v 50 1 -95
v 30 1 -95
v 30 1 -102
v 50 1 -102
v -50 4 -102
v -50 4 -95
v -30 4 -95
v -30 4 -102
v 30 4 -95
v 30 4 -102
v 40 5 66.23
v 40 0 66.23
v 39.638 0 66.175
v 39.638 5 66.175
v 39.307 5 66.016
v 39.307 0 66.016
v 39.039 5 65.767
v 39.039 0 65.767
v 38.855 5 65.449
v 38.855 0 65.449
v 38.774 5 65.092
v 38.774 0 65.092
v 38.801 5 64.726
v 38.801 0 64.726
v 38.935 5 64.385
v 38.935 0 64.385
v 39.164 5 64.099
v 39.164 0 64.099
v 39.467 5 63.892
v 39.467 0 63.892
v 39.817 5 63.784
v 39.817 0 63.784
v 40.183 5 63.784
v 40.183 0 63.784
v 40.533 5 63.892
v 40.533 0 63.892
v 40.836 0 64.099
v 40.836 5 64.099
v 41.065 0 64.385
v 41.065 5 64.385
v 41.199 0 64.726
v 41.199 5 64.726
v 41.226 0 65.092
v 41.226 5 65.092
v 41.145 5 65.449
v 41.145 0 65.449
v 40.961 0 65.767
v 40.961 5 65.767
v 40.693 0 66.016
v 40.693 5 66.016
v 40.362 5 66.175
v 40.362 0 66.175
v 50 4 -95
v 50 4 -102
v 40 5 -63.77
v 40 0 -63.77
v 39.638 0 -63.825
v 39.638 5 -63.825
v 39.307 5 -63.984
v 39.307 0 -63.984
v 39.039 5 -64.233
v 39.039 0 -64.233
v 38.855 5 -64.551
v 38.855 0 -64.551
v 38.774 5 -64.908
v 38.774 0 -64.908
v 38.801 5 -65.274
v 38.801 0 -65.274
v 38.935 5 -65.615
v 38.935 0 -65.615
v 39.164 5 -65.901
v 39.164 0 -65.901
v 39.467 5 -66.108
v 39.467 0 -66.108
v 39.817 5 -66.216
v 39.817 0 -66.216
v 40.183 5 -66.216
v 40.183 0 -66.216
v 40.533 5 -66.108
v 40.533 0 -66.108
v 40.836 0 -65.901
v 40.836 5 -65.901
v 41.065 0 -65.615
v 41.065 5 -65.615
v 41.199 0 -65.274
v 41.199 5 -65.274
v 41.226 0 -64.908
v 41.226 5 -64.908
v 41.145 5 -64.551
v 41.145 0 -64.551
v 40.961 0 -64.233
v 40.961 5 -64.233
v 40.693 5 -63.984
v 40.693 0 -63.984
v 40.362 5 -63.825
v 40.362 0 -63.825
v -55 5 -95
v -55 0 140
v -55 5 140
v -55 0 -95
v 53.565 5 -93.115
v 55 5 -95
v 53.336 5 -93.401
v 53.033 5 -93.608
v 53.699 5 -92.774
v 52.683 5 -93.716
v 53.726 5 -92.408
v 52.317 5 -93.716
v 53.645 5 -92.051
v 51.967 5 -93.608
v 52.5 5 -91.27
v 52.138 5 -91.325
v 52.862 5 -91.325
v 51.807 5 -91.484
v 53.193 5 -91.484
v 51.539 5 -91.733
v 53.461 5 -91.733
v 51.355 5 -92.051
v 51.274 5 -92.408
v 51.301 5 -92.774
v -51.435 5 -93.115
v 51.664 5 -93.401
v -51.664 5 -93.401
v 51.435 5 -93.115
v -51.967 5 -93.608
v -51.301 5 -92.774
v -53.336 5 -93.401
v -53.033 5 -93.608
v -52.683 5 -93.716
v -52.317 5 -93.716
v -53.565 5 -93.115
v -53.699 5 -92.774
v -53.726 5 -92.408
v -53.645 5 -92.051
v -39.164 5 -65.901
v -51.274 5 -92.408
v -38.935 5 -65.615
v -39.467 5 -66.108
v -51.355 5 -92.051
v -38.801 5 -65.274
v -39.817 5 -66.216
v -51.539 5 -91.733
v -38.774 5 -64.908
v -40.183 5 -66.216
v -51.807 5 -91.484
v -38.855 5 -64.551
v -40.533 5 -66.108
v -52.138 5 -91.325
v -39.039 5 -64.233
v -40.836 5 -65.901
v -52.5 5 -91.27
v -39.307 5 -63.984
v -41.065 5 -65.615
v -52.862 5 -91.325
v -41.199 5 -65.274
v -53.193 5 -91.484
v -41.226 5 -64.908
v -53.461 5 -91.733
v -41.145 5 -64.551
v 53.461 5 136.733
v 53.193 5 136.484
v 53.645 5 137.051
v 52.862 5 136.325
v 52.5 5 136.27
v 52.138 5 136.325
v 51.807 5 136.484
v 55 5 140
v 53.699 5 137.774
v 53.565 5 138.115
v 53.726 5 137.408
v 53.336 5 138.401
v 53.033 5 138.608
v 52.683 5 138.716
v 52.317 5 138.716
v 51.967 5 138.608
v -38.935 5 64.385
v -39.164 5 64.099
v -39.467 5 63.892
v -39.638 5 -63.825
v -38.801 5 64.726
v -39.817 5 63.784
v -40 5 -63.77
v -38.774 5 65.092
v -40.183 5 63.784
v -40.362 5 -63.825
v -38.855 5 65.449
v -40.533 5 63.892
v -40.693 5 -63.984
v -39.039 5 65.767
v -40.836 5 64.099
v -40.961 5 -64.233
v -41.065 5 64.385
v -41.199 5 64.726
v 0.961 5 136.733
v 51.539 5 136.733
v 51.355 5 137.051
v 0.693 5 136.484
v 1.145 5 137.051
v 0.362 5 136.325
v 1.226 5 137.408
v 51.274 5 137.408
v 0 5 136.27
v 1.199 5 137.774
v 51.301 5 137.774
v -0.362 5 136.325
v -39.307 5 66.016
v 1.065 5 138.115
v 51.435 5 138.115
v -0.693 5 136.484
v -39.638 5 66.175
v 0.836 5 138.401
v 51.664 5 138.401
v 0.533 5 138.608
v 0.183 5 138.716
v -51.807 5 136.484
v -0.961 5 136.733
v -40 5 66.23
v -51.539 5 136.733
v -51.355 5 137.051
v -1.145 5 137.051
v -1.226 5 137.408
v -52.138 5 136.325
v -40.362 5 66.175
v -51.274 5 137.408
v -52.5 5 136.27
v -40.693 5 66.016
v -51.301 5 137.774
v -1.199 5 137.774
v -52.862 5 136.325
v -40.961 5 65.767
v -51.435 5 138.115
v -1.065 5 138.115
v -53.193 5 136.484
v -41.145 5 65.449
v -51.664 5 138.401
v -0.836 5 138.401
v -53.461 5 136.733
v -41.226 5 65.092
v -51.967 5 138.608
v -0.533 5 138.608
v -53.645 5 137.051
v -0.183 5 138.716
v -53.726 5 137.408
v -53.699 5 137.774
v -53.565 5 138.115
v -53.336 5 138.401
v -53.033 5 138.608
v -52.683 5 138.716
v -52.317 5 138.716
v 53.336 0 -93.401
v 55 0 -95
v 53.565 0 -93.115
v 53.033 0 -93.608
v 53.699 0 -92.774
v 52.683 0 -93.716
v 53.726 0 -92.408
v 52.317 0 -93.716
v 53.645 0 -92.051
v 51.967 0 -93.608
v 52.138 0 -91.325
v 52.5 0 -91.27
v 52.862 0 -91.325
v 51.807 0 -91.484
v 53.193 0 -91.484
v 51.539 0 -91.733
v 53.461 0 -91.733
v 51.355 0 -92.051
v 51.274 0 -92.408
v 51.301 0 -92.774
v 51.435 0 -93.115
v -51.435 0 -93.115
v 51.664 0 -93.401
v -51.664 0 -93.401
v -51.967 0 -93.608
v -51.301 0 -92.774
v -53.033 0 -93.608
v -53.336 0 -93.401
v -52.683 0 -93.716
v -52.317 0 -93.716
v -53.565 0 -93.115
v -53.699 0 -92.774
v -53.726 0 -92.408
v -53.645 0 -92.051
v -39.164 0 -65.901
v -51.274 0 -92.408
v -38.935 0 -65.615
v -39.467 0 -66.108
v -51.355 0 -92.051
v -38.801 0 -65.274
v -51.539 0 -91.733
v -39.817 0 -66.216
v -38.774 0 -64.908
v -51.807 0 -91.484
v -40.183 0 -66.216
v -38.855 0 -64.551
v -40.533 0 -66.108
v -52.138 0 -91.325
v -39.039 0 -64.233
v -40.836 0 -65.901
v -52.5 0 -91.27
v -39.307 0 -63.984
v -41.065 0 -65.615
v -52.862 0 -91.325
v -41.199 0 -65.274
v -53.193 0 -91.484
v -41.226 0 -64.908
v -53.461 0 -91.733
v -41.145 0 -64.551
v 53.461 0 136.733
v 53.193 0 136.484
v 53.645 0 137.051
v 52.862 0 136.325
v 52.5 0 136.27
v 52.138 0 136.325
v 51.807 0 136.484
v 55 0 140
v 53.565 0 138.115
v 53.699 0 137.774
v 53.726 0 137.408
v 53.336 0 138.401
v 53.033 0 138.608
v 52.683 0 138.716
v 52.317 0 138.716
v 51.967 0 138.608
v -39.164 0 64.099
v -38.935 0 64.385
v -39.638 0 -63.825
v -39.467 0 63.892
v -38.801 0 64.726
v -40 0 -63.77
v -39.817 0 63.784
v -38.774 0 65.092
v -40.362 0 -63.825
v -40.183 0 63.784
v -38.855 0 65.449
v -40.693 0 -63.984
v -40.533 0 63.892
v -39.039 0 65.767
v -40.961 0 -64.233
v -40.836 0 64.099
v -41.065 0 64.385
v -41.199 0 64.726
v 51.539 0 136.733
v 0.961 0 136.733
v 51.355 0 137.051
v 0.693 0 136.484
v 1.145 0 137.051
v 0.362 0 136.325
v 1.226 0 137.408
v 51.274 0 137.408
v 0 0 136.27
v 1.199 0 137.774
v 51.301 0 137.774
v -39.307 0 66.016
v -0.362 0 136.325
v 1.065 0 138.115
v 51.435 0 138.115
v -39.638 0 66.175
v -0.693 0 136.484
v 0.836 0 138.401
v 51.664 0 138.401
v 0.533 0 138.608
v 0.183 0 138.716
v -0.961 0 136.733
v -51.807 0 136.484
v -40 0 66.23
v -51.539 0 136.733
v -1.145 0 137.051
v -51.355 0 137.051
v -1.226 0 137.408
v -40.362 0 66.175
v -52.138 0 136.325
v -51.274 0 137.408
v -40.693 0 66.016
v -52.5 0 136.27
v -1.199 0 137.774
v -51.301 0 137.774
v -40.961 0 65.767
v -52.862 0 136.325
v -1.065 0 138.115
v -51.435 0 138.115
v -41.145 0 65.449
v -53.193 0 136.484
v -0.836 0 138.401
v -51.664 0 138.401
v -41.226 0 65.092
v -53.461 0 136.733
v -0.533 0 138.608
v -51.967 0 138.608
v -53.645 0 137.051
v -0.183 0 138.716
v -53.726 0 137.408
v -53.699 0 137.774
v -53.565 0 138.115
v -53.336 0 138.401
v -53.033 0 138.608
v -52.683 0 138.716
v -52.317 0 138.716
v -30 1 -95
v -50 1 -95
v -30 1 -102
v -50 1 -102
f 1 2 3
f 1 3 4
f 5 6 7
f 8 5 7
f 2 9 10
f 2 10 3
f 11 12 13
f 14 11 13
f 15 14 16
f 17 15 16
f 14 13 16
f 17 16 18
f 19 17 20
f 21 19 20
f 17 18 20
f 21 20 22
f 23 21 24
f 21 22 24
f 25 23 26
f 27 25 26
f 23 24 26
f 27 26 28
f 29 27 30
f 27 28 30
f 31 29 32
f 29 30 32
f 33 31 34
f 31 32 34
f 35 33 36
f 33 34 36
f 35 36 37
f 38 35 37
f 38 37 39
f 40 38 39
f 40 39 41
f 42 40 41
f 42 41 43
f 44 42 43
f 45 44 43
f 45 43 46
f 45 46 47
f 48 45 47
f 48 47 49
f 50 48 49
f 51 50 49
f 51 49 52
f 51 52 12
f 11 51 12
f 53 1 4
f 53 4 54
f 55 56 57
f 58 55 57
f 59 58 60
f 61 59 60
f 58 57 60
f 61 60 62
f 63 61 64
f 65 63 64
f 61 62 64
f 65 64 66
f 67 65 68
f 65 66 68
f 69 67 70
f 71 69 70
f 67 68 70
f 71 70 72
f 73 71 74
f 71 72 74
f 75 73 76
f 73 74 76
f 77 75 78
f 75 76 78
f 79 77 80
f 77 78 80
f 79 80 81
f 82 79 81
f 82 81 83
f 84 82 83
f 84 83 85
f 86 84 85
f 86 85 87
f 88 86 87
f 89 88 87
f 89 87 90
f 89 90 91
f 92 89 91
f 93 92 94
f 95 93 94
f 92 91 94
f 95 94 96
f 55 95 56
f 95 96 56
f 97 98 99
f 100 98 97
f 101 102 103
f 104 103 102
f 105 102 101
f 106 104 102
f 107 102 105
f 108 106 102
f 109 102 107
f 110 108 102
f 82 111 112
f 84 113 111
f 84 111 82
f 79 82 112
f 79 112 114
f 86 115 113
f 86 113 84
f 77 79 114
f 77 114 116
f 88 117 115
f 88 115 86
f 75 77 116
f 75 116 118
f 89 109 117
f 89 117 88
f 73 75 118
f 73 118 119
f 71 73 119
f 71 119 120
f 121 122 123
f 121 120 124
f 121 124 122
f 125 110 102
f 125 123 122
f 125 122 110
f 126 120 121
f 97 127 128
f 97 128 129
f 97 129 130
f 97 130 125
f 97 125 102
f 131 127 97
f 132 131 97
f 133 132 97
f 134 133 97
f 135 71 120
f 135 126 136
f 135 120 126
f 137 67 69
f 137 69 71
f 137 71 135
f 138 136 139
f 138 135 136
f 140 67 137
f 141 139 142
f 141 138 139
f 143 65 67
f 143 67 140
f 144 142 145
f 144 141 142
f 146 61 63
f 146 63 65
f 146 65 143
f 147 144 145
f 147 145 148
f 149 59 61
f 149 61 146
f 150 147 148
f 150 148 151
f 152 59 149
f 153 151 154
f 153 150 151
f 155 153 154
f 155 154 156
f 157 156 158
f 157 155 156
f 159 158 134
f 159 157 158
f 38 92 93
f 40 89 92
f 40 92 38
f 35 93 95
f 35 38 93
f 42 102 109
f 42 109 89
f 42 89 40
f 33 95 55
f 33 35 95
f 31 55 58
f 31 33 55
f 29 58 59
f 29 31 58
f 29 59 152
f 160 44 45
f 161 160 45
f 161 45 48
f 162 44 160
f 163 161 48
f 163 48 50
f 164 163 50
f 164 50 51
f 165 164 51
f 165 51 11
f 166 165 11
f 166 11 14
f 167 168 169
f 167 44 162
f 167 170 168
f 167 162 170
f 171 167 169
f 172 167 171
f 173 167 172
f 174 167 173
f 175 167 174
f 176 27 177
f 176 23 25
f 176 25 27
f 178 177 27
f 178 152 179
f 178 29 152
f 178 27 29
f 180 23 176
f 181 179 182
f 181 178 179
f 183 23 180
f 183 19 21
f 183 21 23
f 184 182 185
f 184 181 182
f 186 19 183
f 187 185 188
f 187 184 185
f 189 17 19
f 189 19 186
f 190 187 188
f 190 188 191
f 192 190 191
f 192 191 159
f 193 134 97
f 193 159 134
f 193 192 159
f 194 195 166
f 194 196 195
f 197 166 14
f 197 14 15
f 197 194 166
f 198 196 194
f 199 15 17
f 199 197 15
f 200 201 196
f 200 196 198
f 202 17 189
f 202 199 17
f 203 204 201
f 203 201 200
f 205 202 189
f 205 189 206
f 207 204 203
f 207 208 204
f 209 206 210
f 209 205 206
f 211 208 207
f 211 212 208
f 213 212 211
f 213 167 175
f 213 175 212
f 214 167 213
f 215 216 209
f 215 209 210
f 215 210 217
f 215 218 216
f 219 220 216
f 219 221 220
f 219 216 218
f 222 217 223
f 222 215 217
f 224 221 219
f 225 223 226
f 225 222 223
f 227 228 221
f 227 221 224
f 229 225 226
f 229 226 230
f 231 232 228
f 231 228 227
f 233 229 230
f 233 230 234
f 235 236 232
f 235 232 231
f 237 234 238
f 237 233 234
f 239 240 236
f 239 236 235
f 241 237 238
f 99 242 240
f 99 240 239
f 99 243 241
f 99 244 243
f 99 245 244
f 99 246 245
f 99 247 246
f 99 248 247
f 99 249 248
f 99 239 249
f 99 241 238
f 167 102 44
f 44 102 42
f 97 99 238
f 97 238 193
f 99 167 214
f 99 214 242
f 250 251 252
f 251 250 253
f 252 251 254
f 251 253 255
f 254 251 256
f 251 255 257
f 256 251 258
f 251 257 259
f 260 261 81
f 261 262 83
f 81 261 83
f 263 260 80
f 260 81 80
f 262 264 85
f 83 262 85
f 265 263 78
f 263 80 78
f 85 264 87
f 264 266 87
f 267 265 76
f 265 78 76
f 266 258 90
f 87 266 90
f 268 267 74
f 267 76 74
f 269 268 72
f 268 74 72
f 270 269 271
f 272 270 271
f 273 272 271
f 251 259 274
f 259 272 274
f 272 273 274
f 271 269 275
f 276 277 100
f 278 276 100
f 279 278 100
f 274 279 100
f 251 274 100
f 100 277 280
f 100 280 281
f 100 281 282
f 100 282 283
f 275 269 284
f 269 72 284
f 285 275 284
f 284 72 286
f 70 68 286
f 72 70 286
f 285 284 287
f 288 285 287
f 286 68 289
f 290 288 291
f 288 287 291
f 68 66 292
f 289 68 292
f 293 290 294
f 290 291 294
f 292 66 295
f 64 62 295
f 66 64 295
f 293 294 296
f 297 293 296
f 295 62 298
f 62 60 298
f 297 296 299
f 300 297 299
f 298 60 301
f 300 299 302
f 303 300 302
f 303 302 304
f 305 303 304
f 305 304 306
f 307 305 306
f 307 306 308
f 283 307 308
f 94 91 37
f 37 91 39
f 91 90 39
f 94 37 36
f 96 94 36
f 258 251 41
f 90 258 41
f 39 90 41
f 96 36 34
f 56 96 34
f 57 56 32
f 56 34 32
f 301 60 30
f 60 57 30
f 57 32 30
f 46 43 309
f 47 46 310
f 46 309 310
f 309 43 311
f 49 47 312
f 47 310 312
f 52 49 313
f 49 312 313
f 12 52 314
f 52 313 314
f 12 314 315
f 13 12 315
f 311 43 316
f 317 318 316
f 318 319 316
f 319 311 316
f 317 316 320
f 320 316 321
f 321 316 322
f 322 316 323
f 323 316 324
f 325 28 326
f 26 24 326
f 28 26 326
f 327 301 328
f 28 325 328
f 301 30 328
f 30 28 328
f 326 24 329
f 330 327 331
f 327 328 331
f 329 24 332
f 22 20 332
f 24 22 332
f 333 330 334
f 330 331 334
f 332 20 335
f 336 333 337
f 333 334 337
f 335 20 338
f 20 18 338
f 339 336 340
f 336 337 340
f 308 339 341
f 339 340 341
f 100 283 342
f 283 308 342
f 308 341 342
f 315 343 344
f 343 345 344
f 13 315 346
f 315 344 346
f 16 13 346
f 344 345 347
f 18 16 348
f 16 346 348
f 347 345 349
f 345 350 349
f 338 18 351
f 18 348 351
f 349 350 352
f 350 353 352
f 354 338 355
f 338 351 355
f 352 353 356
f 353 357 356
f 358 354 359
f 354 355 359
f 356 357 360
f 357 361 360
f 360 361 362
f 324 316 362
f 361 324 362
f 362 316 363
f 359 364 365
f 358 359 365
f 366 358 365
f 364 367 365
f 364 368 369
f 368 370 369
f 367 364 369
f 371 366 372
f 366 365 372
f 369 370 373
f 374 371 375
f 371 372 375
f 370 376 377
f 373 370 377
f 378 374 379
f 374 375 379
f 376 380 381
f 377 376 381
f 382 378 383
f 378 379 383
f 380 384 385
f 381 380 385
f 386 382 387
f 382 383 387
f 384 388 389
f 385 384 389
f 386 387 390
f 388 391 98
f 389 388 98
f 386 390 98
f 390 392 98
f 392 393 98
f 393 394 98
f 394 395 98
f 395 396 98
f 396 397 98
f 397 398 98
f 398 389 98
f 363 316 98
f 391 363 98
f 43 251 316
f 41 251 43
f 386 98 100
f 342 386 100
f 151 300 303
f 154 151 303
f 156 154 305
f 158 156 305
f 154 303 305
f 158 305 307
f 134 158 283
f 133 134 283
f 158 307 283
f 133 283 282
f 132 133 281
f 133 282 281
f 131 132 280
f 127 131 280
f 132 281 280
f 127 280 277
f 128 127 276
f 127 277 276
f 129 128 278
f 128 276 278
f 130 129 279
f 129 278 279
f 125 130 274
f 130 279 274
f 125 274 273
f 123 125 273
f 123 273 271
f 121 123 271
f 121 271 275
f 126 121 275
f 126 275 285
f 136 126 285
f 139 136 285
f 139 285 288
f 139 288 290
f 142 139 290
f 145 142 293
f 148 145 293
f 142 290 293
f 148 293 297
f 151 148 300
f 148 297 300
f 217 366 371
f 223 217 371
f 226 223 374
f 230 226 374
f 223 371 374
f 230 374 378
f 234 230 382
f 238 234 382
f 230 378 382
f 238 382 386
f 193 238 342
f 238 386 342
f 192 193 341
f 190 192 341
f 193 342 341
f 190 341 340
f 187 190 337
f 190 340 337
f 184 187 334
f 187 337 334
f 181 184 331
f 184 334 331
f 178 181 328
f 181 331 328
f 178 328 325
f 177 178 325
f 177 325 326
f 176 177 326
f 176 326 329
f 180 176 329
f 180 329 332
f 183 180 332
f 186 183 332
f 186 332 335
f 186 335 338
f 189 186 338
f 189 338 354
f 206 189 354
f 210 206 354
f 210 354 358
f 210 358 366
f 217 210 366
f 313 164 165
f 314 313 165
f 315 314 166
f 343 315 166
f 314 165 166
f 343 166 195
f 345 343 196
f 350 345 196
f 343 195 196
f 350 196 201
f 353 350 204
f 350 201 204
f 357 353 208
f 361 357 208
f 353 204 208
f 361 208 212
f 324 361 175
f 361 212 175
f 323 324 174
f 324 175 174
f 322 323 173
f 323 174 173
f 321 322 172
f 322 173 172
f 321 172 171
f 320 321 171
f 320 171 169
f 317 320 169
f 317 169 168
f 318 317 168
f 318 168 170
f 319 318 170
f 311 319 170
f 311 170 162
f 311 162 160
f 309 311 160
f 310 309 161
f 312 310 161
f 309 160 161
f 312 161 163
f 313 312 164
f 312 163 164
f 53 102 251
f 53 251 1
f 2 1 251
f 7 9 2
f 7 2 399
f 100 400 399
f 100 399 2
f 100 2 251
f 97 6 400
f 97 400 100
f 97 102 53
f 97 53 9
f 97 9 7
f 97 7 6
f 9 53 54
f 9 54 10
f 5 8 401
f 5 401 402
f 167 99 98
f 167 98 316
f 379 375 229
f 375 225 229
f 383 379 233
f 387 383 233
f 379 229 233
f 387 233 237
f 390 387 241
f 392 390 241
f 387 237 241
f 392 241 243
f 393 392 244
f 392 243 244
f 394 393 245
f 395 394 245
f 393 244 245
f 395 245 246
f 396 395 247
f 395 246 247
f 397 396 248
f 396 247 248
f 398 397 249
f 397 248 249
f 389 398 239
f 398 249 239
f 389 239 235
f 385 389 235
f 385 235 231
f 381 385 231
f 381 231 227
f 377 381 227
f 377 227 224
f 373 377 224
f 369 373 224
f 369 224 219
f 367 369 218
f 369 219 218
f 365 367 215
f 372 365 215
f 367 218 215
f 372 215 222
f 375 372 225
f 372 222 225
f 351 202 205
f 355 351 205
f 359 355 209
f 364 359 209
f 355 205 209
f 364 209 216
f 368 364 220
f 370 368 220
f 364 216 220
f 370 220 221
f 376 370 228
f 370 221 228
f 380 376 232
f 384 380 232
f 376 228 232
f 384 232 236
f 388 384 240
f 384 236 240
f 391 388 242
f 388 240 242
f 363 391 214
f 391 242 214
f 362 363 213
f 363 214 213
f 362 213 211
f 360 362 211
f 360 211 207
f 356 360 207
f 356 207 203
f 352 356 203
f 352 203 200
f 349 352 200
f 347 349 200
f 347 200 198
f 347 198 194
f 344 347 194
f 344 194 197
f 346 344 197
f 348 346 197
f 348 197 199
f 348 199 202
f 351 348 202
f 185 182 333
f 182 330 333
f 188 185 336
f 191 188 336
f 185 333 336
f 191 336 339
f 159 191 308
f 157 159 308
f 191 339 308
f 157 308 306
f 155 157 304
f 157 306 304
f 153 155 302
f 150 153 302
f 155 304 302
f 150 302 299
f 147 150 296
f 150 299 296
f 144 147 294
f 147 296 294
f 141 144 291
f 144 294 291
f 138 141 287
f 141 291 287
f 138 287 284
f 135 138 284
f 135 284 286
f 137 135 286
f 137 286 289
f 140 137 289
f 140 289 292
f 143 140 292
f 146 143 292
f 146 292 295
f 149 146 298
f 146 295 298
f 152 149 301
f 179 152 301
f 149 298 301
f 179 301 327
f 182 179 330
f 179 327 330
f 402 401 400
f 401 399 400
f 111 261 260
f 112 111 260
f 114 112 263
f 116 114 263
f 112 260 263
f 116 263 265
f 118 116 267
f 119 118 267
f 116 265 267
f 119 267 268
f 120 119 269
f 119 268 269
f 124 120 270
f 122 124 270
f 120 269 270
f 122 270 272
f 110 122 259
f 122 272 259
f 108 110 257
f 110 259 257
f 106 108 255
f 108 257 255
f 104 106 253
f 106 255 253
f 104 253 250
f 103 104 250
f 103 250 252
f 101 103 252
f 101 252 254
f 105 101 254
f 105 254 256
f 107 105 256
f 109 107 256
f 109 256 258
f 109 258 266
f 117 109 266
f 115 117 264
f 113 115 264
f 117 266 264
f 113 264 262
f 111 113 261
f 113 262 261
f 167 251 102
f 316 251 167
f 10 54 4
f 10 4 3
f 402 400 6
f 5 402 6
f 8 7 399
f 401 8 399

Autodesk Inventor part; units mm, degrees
ref_plane "YZ Plane" through (0, 0, 0) normal (1, 0, 0) x (0, 1, 0)
ref_plane "XZ Plane" through (0, 0, 0) normal (0, 1, 0) x (-1, 0, 0)
ref_plane "XY Plane" through (0, 0, 0) normal (0, 0, 1) x (1, 0, 0)
sketch "Esquisse1" plane through (0, 0, 0) normal (0, 1, 0) x (-1, 0, 0)
  line L0 (55, -100) -> (-55, -100)
  line L1 (-55, -100) -> (-55, 100)
  line L2 (-55, 100) -> (55, 100)
  line L3 (55, 100) -> (55, -100)
  line L4 (55, -100) -> (-55, 100) construction
  line L5 (-55, -100) -> (55, 100) construction
  point P0 (0, 0)
  dimension "d0" = 110
  dimension "d1" = 200
extrude "Extrusion1" add sketch "Esquisse1" along normal blind 5
sketch "Esquisse6" plane through (-55, 0, 100) normal (0, 0, 1) x (1, 0, 0)
  line L0 (0, 0) -> (110, 0) projected
  line L1 (110, 0) -> (110, 5) projected
  line L2 (0, 5) -> (110, 5) projected
  line L3 (0, 0) -> (0, 5) projected
  point P0 (55, 0)
extrude "Extrusion2" add sketch "Esquisse6" along normal blind 40
sketch "Esquisse3" plane through (0, 0, 0) normal (0, -1, 0) x (1, 0, 0)
  line L0 (0, 0) -> (52.5, 0)
  line L1 (52.5, 0) -> (52.5, -97.5)
  line L2 (0, 28.6272) -> (0, -29.3855)
  line L3 (0, 0) -> (0, 137.5)
  line L4 (0, 137.5) -> (52.5, 137.5)
  point P0 (-52.5, -97.5)
  point P1 (-52.5, 137.5)
  dimension "d18" = 52.5
  dimension "d19" = 97.5
  dimension "d49" = 137.5
  dimension "d50" = 52.5
hole "Perçage2" at (52.5, 0, -97.5) at (-52.5, 0, -97.5) at (-52.5, 0, 137.5) at (52.5, 0, 137.5) direction (0, 1, 0) diameter 2.459 end through all thread size "M3x0.5" class "6H" standard "ISO Metric profile"
sketch "Esquisse5" plane through (0, 5, 0) normal (0, 1, 0) x (1, 0, 0)
  line L0 (0, 0) -> (-40, 0)
  line L1 (-40, 0) -> (-40, 65)
  line L2 (-40, 65) -> (40, 65)
  line L3 (40, 65) -> (40, -65)
  line L4 (40, -65) -> (-40, -65)
  line L5 (-40, -65) -> (-40, 0)
  dimension "d36" = 40
  dimension "d37" = 65
  dimension "d38" = 80
  dimension "d39" = 130
hole "Perçage4" at (-40, 5, -65) at (40, 5, -65) at (40, 5, 65) at (-40, 5, 65) direction (0, -1, 0) diameter 2.459 end through all thread size "M3x0.5" class "6H" standard "ISO Metric profile"
sketch "Esquisse4" plane through (0, 0, 0) normal (0, -1, 0) x (1, 0, 0)
  line L0 (0, 0) -> (0, 137.5)
  line L1 (0, 0) -> (87.5, 0)
  line L2 (0, 0) -> (0, -97.5)
  line L3 (55, -100) -> (-55, -100) projected
  point P0 (-87.5, 0)
  dimension "d27" = 137.5
  dimension "d28" = 87.5
  dimension "d51" = 97.5
hole "Perçage3" at (87.5, 0, 0) at (0, 0, 137.5) at (-87.5, 0, 0) at (0, 0, -97.5) direction (0, 1, 0) diameter 2.459 end through all thread size "M3x0.5" class "6H" standard "ISO Metric profile"
sketch "Esquisse7" plane through (0, 5, 0) normal (0, 1, 0) x (1, 0, 0)
  line L0 (55, 100) -> (-55, 100) projected
  line L1 (55, 100) -> (55, -140) projected
  line L2 (-55, 100) -> (55, 100)
  line L3 (55, 100) -> (55, 95)
  line L4 (55, 95) -> (-55, 95)
  line L5 (-55, 95) -> (-55, 100)
  point P0 (0, 0)
  dimension "d52" = 5
extrude "Extrusion3" cut sketch "Esquisse7" against normal blind 10
sketch "Esquisse8" plane through (0, 5, 0) normal (0, 1, 0) x (1, 0, 0)
  line L0 (-55, 95) -> (-55, -140) projected
  line L1 (-55, 95) -> (-55, 92.5)
  line L2 (-55, 92.5) -> (-52.5, 92.5)
  line L3 (55, 95) -> (55, -140) projected
  line L4 (55, 95) -> (52.5, 95)
  line L5 (-55, 95) -> (55, 95) projected
  line L6 (52.5, 95) -> (52.5, 92.5)
  point P0 (0, 0)
  dimension "d55" = 2.5
  dimension "d56" = 2.5
  dimension "d57" = 2.5
hole "Perçage5" at (-52.5, 5, -92.5) at (52.5, 5, -92.5) direction (0, -1, 0) diameter 2.459 end through all thread size "M3x0.5" class "6H" standard "ISO Metric profile"
sketch "Esquisse9" plane through (55, 5, -95) normal (0, 0, -1) x (-1, 0, 0)
  line L0 (0, -5) -> (0, 0) projected
  line L1 (0, 0) -> (5, 0)
  line L2 (0, 0) -> (110, 0) projected
  line L3 (5, 0) -> (5, -1)
  line L4 (5, -1) -> (25, -1)
  line L5 (25, -1) -> (25, -4)
  line L6 (25, -4) -> (5, -4)
  line L7 (5, -4) -> (5, -1)
  line L8 (110, 0) -> (105, 0)
  line L9 (105, 0) -> (105, -1)
  line L10 (105, -1) -> (85, -1)
  line L11 (85, -1) -> (85, -4)
  line L12 (85, -4) -> (105, -4)
  line L13 (105, -4) -> (105, -1)
  point P0 (55, -5)
  dimension "d65" = 5
  dimension "d66" = 1
  dimension "d67" = 20
  dimension "d68" = 3
  dimension "d69" = 5
  dimension "d70" = 20
extrude "Extrusion4" add sketch "Esquisse9" along normal blind 7
properties part number "chassis_bas"
